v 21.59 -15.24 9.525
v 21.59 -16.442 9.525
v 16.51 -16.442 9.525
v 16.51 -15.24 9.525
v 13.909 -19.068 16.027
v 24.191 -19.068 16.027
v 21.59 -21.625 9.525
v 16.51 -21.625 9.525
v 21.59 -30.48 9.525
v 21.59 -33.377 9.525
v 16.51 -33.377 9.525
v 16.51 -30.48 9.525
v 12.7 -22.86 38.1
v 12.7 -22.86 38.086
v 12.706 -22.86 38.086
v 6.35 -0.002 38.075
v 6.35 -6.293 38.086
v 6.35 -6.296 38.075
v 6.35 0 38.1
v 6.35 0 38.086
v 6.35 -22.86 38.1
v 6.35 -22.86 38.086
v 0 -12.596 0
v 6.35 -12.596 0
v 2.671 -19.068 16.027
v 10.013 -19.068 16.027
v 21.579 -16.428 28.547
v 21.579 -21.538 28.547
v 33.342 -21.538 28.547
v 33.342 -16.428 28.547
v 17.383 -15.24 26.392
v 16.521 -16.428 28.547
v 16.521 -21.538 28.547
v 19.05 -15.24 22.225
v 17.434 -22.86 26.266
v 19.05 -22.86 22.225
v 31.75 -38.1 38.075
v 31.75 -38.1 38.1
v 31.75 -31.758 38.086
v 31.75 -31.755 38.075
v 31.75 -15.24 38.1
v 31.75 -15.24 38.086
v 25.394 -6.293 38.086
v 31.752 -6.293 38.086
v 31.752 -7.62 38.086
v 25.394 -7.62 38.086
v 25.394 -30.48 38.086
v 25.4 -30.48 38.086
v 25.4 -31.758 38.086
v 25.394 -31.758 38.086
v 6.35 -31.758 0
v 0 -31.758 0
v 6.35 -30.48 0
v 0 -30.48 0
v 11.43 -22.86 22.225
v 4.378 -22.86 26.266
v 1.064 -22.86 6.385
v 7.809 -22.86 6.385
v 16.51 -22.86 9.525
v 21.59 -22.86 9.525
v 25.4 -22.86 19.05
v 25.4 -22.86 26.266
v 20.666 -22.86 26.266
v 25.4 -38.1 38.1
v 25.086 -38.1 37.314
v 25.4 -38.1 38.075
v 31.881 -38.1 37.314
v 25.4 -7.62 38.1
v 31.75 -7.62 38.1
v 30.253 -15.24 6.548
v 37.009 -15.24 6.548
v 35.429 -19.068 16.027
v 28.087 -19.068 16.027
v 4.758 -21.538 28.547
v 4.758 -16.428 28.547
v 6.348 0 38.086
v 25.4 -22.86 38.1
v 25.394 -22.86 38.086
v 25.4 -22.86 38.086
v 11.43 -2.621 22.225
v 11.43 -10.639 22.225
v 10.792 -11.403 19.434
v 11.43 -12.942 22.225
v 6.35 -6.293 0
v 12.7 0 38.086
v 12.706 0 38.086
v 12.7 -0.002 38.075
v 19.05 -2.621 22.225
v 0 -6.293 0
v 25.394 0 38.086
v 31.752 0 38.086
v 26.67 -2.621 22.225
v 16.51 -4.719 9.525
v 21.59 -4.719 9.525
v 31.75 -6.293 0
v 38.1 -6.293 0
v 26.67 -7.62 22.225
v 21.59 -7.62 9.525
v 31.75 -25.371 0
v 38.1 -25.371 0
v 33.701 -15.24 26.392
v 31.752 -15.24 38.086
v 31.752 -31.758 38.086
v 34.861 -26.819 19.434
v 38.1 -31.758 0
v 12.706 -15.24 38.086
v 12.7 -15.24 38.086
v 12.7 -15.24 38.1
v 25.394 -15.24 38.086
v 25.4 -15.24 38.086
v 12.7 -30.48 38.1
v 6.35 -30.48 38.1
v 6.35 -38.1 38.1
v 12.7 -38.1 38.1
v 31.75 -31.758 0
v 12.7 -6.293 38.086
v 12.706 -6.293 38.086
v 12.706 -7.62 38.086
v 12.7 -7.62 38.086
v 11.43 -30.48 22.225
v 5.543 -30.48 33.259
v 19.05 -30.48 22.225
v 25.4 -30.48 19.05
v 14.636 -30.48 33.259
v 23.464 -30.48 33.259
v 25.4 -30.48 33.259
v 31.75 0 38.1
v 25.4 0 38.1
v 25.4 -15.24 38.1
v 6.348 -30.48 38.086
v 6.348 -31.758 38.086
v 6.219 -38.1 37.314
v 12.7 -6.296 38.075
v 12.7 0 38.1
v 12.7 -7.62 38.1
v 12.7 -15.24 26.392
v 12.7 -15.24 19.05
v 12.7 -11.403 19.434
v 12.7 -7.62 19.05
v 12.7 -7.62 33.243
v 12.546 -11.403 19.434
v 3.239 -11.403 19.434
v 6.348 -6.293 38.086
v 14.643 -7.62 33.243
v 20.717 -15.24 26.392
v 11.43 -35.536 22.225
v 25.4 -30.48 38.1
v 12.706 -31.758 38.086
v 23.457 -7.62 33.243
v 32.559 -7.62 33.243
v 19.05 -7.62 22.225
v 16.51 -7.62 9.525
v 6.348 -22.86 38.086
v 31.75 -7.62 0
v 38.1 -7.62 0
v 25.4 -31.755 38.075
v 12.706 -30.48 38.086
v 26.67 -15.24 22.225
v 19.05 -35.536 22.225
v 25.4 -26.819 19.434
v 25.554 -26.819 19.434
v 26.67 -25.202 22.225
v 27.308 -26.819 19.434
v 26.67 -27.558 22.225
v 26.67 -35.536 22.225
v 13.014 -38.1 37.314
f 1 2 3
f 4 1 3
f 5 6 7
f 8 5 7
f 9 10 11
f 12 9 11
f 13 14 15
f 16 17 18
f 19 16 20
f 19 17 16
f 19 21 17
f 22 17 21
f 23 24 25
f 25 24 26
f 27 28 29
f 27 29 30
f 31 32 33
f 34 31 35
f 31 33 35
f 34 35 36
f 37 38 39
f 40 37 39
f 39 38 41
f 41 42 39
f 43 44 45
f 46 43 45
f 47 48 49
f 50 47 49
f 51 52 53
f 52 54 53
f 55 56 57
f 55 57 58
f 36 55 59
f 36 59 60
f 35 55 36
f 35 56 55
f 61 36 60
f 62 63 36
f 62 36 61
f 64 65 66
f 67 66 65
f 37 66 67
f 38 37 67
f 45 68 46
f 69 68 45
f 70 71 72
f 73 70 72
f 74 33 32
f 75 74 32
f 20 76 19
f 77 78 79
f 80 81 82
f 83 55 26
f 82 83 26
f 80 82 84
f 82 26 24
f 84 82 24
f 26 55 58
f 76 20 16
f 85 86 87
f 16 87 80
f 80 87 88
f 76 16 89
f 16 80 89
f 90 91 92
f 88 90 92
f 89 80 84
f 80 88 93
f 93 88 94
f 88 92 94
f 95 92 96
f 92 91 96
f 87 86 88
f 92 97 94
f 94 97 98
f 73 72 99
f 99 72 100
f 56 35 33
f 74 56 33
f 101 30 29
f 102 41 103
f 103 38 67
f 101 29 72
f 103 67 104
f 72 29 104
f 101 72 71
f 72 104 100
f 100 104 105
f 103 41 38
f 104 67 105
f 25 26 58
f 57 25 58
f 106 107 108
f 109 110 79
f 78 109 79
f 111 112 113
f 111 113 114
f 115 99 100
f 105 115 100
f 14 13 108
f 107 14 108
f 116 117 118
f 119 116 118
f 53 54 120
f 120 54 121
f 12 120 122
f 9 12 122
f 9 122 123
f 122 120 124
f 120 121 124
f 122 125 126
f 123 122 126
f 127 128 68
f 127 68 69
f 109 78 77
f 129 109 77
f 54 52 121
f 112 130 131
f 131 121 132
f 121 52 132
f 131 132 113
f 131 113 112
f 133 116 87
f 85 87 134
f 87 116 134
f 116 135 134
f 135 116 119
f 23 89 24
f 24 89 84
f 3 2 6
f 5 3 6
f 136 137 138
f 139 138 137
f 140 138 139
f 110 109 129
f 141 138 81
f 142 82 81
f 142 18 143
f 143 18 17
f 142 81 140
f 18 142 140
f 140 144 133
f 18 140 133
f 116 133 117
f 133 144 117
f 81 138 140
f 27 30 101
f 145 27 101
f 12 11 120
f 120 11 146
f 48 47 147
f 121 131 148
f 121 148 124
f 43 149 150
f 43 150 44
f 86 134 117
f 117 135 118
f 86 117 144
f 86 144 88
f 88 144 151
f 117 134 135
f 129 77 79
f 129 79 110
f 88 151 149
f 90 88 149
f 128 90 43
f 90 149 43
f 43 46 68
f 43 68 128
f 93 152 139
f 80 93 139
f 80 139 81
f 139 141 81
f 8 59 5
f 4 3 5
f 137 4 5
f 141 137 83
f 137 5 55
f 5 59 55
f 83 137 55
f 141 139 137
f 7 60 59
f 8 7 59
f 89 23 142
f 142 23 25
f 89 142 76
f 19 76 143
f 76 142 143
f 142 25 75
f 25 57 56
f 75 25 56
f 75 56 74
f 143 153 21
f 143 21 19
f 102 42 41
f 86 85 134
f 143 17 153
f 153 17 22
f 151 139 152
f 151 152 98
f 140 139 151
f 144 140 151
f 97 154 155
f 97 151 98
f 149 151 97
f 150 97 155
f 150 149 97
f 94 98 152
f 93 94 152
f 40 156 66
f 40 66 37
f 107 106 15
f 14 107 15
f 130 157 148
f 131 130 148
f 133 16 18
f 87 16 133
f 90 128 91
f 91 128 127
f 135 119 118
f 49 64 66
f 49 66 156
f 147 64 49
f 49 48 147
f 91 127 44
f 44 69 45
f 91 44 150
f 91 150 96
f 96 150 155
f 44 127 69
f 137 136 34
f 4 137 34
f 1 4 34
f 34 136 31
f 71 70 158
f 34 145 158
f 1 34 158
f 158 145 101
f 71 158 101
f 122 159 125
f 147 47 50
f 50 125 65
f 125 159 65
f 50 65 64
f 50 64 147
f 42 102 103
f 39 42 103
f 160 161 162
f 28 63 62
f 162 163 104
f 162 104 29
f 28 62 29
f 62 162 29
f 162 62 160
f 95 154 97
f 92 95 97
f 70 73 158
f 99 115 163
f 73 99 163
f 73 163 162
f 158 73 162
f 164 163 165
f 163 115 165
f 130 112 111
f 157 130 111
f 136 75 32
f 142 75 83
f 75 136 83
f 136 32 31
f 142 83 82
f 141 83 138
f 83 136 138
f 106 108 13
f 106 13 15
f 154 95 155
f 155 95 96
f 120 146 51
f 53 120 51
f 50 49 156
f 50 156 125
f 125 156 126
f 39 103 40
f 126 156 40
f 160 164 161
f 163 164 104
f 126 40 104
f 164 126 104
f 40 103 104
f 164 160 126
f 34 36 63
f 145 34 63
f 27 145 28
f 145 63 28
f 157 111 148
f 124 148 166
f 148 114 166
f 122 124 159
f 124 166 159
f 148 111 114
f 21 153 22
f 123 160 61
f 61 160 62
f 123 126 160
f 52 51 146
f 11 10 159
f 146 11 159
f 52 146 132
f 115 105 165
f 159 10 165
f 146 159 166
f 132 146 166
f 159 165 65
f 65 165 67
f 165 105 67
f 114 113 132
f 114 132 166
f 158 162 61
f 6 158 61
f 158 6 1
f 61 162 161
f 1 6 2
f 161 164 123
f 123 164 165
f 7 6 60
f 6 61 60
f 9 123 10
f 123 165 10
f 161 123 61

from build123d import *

# Parameters (mm, degrees)
F0_W      = 38.1
F0_H      = 38.1
F1_DEPTH  = 38.1
F6_DEPTH  = 38.1
F8_DEPTH  = 38.1
F9_W      = 25.4
F9_H      = 7.62
F10_DEPTH = 38.1
F11_DEPTH = 0.0254


with BuildPart() as f1:
    # F0 (on Front) → F1 (new body)
    with BuildSketch(Plane.XZ):
        with Locations((19.05, 19.05)):
            Rectangle(F0_W, F0_H)
    extrude(amount=F1_DEPTH)

    # F5 (on offset) → F6 (cut)
    with BuildSketch(Plane.YZ.offset(38.1)):
        Polygon((0, 0), (0, 38.0859561265), (-6.2931971624, 0), align=None)
        Polygon((-25.370804593, 0), (-12.5956209376, 0), (-19.0683808178, 16.0274729133), align=None)
        Polygon((-38.2311567664, 0), (-31.7583978176, 0), (-38.2311567664, 38.0859561265), align=None)
        Polygon((-31.7583978176, 38.0859561265), (-26.8186591566, 19.4341894239), (-21.5382501483, 28.5471547395), (-16.4281763136, 28.5471547395), (-11.4032700658, 19.4341894239), (-6.2931971624, 38.0859561265), align=None)
    extrude(amount=-F6_DEPTH, mode=Mode.SUBTRACT)

    # F7 (on offset) → F8 (cut)
    with BuildSketch(Plane.XZ.offset(38.1)):
        Polygon((0, 38.1), (0, 0), (6.35, 38.1), align=None)
        Polygon((11.43, 22.225), (6.35, 0), (31.75, 0), (26.67, 22.225), (21.59, 9.525), (16.51, 9.525), align=None)
        Polygon((25.4, 38.1), (12.7, 38.1), (19.05, 22.225), align=None)
        Polygon((31.75, 38.1), (38.1, 0), (38.1, 38.1), align=None)
    extrude(amount=-F8_DEPTH, mode=Mode.SUBTRACT)

    # F9 (on offset) → F10 (cut)
    with BuildSketch(Plane.XY.offset(38.1)):
        with Locations((25.4, -11.43)):
            Rectangle(F9_W, F9_H)
        with Locations((12.7, -26.67)):
            Rectangle(F9_W, F9_H)
    extrude(amount=-F10_DEPTH, mode=Mode.SUBTRACT)

    # F11 (cut): faces of the model
    f11_faces = [f1.faces().sort_by_distance(p)[0] for p in [
        (9.525, -11.43, 38.1),
        (28.575, -26.67, 38.1),
    ]]
    extrude(f11_faces, amount=-F11_DEPTH, mode=Mode.SUBTRACT)


solid = f1.part
